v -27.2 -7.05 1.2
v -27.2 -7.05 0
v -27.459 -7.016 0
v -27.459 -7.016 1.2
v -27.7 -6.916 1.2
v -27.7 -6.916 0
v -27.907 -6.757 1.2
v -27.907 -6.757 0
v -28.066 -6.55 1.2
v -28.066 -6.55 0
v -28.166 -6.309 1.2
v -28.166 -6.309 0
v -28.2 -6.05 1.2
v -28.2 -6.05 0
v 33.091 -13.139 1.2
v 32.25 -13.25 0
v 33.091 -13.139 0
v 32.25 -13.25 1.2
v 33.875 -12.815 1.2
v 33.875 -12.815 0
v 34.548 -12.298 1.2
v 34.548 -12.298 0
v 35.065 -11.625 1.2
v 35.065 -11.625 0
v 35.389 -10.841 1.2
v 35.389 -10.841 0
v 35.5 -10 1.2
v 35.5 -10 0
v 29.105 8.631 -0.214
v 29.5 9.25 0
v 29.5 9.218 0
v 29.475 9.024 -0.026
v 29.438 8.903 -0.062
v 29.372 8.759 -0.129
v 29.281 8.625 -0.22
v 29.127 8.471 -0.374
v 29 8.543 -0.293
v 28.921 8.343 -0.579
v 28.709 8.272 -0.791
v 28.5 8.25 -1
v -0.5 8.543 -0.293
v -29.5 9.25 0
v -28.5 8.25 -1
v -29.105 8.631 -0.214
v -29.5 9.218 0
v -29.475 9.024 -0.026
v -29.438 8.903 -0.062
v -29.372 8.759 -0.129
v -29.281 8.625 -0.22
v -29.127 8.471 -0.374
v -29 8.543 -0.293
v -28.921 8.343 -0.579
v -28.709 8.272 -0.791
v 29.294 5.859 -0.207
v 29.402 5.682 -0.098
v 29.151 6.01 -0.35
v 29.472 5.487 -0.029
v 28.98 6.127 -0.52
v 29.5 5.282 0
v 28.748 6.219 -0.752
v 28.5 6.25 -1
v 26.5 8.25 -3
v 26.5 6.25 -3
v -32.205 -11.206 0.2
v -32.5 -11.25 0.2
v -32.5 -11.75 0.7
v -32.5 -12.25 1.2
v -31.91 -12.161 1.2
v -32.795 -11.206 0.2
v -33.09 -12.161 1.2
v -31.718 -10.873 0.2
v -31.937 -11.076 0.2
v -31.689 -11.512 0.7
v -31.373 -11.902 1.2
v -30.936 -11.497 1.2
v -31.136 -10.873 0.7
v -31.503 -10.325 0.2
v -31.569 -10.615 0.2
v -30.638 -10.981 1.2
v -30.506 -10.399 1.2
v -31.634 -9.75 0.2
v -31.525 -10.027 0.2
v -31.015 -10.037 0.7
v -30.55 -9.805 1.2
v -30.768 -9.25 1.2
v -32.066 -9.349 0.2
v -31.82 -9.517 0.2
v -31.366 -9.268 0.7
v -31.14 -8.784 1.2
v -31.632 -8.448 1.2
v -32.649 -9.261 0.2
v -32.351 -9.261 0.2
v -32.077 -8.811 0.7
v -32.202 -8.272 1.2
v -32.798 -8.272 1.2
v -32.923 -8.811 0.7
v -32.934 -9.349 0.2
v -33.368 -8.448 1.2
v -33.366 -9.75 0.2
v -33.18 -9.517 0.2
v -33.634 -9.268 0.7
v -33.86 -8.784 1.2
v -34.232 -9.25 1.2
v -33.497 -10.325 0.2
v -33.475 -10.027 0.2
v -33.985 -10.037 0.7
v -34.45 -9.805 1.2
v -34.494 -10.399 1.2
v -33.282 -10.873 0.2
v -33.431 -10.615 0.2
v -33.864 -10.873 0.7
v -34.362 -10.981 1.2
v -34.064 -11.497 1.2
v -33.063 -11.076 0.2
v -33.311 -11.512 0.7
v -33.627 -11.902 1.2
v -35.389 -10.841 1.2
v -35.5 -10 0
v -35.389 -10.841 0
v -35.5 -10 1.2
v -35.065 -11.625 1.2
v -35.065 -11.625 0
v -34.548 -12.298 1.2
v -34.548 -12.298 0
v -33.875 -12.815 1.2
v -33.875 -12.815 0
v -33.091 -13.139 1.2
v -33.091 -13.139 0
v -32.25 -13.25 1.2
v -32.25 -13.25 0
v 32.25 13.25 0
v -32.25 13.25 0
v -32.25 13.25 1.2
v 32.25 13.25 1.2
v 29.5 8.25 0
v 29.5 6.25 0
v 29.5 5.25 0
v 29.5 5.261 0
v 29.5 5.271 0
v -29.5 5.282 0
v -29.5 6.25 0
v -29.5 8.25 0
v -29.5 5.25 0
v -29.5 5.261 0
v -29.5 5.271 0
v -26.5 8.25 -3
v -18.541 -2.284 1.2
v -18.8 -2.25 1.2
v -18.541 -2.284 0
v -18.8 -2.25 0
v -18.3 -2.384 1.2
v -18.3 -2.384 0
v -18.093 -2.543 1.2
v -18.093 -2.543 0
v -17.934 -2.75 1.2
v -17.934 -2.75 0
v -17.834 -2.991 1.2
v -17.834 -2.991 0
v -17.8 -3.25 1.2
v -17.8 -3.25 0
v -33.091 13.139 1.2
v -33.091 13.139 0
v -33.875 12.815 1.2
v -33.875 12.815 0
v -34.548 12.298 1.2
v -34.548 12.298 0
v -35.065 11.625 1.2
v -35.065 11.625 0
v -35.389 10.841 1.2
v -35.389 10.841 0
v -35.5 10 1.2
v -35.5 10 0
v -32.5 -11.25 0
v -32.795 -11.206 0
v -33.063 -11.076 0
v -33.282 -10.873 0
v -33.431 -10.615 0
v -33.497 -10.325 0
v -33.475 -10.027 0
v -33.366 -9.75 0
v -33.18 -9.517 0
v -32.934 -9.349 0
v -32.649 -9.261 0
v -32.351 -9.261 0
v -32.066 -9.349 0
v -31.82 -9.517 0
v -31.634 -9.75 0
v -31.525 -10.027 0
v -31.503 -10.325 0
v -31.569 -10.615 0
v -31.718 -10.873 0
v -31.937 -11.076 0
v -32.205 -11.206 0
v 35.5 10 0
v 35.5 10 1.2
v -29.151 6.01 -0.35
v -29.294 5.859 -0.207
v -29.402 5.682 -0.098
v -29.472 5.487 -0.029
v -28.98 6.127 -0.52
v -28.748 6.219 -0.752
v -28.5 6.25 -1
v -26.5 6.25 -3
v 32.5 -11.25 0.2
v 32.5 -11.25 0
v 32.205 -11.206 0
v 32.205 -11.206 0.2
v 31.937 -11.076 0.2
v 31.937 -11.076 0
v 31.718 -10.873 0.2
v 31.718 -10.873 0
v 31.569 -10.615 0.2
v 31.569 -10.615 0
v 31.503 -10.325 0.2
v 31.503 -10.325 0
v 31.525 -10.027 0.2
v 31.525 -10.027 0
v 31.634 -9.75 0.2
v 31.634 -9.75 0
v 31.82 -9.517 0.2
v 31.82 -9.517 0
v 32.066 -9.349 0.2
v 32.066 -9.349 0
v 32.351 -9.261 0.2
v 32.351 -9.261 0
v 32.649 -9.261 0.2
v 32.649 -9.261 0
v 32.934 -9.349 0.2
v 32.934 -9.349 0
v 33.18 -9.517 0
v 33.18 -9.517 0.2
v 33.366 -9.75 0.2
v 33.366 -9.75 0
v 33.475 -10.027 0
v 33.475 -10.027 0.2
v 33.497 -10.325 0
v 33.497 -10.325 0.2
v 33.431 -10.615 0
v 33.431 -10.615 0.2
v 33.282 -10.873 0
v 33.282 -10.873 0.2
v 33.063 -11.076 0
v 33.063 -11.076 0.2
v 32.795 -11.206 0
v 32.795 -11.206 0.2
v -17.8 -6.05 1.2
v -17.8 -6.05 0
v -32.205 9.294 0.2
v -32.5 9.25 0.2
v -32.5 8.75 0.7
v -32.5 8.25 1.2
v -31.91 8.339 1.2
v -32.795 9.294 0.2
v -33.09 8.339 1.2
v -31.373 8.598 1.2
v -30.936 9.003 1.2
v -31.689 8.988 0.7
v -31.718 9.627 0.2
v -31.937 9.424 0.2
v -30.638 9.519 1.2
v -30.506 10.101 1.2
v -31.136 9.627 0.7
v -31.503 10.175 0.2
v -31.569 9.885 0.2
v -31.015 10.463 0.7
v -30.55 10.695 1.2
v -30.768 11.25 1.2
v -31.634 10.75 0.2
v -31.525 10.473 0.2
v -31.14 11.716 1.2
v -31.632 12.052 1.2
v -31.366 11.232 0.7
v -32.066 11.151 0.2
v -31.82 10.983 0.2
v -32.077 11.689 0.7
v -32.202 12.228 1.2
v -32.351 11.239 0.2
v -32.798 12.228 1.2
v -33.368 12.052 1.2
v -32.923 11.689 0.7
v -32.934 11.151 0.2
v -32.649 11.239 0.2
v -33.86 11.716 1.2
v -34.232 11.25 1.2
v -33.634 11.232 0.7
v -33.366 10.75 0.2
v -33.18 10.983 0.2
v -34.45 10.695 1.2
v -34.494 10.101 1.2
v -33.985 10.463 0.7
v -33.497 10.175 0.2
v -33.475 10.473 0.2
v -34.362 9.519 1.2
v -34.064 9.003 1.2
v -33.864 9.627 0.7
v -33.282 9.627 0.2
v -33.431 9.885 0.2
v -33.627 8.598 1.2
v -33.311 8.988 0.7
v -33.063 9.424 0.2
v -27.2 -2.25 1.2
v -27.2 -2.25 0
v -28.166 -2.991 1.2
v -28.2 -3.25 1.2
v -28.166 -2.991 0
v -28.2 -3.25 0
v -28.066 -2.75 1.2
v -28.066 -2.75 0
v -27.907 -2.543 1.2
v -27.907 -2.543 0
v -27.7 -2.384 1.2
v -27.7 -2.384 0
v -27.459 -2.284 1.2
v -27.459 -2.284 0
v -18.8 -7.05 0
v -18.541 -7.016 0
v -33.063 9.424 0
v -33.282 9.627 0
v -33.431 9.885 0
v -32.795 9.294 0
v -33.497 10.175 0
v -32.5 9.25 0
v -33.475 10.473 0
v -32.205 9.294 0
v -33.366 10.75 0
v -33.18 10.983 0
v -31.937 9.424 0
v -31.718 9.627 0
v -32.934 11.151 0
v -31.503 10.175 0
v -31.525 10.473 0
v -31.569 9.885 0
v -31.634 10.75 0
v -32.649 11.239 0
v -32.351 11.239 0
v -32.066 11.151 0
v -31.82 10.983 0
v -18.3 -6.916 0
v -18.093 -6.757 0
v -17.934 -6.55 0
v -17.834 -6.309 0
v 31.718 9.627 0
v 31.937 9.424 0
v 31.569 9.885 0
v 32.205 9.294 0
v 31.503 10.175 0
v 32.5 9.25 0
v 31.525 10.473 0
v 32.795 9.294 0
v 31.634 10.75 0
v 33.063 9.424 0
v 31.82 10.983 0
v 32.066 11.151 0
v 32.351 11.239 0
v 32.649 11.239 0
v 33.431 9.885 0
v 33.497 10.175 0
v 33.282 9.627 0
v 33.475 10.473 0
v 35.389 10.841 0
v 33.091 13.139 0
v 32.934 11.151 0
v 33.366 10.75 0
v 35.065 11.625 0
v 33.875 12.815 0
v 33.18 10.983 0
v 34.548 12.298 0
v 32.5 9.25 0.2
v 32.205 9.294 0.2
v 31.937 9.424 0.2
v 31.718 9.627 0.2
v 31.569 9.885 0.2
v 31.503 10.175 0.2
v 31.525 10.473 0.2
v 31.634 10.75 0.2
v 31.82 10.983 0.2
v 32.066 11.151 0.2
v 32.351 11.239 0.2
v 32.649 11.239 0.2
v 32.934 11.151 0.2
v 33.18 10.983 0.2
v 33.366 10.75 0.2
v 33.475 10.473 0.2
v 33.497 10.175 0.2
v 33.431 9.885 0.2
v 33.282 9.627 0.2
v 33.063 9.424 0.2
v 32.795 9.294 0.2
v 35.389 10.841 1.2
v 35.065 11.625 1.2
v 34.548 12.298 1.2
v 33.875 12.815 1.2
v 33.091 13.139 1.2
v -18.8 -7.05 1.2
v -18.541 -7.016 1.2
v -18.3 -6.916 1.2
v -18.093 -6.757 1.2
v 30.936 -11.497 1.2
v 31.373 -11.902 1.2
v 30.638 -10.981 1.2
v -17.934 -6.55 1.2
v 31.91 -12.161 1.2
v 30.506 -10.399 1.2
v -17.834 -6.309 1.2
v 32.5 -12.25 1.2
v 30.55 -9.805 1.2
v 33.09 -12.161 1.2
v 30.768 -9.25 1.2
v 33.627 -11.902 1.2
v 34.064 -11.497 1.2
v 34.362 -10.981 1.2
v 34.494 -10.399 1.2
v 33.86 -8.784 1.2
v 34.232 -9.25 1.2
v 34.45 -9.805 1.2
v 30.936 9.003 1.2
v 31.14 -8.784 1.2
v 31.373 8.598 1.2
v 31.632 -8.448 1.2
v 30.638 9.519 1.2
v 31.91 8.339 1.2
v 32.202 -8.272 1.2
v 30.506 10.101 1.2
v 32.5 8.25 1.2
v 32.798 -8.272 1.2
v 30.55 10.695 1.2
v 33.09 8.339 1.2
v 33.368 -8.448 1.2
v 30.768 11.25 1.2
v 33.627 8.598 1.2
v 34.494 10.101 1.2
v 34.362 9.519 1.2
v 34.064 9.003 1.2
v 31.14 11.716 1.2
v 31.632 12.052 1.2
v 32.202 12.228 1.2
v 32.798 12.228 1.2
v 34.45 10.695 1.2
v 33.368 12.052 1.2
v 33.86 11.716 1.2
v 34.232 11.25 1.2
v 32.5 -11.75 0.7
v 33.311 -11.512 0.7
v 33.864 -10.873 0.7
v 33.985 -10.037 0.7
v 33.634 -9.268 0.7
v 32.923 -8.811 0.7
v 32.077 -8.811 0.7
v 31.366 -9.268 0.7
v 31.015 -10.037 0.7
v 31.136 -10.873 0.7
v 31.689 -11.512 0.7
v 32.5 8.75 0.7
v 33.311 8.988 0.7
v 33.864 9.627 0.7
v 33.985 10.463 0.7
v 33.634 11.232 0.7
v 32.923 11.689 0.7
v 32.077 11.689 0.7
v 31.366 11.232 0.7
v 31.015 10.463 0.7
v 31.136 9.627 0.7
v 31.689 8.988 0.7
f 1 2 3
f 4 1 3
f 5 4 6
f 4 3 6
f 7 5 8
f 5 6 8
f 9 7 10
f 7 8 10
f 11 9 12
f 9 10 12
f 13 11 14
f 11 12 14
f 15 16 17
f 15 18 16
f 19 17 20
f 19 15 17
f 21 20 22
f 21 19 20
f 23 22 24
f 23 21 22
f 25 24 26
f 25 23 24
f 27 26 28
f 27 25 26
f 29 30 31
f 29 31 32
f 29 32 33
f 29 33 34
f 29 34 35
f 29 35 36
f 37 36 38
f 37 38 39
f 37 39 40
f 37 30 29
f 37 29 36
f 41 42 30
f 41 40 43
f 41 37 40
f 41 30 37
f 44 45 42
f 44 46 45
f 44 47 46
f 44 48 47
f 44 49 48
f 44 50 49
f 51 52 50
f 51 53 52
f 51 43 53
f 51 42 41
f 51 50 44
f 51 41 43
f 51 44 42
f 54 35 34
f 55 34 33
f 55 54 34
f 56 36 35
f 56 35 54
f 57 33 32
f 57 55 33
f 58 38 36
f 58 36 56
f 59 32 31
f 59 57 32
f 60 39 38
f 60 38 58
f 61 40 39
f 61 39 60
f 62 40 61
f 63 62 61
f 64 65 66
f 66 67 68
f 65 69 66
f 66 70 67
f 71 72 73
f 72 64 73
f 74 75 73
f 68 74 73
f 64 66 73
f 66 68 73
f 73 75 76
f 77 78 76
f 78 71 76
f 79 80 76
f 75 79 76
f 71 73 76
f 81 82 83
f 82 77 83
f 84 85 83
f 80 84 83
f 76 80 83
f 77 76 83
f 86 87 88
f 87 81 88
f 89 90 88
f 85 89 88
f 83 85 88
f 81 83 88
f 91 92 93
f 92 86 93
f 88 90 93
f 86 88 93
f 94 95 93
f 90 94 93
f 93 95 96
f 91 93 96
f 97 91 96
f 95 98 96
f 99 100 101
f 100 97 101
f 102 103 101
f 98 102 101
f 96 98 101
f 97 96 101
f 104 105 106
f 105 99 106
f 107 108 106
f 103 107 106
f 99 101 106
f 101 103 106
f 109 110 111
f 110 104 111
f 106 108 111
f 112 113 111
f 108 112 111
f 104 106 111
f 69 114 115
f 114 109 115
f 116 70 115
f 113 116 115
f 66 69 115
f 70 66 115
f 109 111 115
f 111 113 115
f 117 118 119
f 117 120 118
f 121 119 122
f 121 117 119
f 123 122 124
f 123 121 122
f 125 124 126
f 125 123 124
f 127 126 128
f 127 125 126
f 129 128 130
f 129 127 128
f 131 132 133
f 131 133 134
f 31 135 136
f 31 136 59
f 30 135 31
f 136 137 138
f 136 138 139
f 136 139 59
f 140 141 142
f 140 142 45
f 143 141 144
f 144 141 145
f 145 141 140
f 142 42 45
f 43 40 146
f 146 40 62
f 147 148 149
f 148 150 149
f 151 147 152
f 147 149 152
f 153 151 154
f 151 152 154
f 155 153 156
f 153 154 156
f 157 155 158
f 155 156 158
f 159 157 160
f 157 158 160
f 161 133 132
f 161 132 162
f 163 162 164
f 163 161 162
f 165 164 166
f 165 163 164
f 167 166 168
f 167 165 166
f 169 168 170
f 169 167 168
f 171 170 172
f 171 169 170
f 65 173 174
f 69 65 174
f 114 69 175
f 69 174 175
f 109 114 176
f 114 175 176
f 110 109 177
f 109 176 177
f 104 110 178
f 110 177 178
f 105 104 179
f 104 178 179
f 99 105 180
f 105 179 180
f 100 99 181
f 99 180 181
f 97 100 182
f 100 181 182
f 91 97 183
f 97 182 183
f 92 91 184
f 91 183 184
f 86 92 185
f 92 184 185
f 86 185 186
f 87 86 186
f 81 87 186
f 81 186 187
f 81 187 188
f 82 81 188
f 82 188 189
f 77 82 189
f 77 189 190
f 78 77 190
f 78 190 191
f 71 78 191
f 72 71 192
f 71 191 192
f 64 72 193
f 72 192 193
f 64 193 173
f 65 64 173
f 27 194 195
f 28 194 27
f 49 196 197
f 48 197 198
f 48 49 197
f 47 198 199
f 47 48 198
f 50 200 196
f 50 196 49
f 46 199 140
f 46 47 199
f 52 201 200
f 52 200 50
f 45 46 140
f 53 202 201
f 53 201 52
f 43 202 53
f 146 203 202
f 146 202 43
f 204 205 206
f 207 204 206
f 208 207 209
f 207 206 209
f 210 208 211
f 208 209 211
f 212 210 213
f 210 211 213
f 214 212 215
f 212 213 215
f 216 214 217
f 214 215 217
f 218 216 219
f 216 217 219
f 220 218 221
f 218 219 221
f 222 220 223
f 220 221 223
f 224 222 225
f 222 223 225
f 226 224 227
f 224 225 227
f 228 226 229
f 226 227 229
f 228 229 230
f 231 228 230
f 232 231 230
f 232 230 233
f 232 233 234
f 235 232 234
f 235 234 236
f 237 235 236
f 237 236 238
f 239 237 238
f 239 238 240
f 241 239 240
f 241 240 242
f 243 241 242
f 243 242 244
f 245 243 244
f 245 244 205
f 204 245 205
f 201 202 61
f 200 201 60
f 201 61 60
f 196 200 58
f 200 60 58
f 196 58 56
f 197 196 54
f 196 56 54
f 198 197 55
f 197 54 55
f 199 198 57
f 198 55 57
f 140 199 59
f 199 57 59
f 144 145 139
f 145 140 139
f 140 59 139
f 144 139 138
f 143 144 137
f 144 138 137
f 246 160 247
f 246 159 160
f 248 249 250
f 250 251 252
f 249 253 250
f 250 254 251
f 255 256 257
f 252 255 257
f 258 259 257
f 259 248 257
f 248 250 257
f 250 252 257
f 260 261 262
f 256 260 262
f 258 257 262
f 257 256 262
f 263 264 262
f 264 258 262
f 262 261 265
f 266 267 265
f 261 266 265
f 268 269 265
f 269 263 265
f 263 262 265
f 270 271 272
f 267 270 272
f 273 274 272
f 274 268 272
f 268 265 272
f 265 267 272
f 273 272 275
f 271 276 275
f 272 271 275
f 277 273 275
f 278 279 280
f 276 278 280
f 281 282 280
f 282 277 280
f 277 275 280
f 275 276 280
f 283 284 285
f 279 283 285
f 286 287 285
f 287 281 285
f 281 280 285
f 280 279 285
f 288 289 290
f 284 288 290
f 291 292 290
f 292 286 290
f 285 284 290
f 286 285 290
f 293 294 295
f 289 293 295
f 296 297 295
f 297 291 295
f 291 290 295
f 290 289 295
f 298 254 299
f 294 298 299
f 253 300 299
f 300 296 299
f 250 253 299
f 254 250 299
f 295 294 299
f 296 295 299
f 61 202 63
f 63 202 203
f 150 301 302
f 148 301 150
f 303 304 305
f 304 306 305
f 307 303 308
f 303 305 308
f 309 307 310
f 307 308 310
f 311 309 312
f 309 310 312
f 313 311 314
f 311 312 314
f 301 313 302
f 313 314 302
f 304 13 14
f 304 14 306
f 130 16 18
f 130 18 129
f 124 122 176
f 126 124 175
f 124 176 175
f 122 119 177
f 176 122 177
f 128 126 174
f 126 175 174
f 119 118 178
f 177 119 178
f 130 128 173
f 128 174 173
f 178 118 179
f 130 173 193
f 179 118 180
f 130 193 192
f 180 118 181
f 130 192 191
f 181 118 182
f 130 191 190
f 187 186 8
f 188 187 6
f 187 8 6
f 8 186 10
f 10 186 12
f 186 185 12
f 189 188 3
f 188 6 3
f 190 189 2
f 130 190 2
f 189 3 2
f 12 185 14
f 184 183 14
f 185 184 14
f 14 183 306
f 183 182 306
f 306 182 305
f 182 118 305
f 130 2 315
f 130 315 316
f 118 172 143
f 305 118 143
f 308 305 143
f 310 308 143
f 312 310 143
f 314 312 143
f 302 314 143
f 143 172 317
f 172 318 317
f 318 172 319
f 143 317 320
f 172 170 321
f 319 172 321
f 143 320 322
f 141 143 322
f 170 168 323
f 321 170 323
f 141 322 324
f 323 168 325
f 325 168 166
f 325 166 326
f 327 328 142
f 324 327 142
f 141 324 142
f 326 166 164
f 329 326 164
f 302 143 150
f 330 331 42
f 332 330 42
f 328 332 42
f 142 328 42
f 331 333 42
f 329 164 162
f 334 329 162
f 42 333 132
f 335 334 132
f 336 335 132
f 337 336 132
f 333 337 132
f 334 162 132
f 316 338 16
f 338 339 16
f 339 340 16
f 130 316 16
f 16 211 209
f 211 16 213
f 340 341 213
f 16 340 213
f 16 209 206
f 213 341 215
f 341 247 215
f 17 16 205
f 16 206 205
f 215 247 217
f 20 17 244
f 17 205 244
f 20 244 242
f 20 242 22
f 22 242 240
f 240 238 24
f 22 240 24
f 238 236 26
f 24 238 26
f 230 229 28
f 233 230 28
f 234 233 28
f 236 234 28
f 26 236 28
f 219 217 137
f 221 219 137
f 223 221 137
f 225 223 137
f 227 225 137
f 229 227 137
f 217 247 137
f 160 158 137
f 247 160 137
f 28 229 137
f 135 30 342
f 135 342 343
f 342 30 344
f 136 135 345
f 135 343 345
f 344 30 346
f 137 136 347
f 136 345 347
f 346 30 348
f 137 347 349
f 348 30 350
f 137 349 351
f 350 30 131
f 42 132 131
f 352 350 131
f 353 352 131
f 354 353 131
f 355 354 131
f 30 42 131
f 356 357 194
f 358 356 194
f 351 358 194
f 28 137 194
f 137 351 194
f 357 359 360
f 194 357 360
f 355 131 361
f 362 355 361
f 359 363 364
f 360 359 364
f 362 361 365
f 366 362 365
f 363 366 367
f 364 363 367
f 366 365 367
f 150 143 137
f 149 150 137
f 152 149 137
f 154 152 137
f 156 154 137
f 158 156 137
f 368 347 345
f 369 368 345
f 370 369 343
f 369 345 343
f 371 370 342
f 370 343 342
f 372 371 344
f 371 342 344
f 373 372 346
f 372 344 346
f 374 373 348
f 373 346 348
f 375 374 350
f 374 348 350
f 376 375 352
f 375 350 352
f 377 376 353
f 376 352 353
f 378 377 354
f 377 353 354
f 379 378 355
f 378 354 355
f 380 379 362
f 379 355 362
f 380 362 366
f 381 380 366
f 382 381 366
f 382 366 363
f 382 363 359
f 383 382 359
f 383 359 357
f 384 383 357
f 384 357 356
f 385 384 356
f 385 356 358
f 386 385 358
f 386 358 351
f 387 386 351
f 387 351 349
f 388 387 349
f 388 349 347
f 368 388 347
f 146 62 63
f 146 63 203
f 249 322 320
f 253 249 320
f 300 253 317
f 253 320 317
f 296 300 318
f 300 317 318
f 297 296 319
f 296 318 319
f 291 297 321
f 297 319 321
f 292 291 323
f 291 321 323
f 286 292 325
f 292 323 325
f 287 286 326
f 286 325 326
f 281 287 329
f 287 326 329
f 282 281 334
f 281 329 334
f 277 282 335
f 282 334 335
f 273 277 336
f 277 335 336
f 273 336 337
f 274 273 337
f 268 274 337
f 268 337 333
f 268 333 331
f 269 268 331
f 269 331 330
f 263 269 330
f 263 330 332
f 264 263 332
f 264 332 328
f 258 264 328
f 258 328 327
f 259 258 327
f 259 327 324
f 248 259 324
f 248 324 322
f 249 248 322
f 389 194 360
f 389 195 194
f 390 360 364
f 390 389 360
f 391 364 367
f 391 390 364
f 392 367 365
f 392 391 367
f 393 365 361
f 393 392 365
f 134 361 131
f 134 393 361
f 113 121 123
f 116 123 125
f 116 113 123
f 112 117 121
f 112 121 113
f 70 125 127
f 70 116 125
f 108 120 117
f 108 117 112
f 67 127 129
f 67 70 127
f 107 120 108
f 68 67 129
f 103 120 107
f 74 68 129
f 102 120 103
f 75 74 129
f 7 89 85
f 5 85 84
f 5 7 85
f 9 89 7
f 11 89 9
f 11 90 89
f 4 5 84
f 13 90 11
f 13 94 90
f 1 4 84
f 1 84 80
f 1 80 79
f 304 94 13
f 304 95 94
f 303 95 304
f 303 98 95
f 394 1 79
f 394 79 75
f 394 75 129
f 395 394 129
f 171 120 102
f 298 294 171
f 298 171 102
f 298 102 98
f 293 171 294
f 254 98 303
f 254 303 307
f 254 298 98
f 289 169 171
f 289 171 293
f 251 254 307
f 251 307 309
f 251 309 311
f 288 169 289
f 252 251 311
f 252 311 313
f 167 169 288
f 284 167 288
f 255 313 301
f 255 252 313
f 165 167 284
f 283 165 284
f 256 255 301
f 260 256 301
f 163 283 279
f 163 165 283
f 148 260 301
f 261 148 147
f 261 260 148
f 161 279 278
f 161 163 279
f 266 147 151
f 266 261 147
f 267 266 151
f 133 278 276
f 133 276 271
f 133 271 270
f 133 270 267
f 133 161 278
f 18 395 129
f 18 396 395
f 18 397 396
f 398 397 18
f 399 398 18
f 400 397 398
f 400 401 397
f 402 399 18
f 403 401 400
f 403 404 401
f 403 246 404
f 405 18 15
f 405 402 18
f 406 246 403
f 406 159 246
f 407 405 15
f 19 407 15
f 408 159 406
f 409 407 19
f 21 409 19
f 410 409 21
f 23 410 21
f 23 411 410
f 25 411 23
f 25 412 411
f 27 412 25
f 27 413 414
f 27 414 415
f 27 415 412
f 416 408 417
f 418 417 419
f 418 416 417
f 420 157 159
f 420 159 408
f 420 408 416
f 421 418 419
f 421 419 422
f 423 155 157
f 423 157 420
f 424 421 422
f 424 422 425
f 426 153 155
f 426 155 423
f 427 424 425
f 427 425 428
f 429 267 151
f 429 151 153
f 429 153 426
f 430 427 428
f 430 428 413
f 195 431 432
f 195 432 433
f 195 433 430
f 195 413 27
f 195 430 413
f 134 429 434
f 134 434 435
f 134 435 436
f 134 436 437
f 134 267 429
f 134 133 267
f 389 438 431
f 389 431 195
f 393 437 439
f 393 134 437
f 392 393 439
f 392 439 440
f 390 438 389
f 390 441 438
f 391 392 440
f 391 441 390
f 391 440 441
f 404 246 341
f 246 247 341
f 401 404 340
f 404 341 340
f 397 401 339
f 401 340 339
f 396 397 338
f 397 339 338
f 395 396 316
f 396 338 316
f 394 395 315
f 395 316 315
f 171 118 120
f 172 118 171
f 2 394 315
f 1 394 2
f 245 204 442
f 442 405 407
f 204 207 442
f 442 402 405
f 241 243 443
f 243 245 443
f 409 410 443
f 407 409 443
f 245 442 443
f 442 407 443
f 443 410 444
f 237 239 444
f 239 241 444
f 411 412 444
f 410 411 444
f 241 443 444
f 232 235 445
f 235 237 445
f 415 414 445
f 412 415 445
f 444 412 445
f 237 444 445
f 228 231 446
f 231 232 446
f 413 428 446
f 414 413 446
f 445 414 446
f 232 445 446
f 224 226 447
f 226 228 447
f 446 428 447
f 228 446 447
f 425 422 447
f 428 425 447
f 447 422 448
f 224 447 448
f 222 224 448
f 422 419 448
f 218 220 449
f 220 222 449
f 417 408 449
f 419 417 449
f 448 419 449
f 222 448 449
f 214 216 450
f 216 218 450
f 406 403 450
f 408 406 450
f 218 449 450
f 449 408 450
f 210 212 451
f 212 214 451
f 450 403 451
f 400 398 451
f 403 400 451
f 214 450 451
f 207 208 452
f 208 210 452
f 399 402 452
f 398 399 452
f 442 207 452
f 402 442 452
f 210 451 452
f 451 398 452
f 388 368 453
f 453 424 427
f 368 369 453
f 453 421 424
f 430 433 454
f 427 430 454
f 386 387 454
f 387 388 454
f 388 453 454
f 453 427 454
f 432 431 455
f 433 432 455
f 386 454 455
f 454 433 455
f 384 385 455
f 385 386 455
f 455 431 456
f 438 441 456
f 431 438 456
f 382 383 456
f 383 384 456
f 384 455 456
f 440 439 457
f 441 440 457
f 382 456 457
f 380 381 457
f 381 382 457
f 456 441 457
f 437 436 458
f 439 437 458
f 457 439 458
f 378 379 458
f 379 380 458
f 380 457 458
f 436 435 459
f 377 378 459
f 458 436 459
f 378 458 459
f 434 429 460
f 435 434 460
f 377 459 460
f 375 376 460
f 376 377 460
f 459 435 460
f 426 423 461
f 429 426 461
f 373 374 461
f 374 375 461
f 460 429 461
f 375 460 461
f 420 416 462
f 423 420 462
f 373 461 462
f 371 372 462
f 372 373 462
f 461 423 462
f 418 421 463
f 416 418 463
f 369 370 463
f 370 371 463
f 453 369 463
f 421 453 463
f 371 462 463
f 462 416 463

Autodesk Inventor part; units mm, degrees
ref_plane "YZ Plane" through (0, 0, 0) normal (1, 0, 0) x (0, 1, 0)
ref_plane "XZ Plane" through (0, 0, 0) normal (0, 1, 0) x (-1, 0, 0)
ref_plane "XY Plane" through (0, 0, 0) normal (0, 0, 1) x (1, 0, 0)
sketch "Sketch1" plane through (0, 0, 0) normal (0, 0, 1) x (1, 0, 0)
  line L0 (-35.5, 13.25) -> (35.5, 13.25)
  line L1 (35.5, 13.25) -> (35.5, -13.25)
  line L2 (35.5, -13.25) -> (-35.5, -13.25)
  line L3 (-35.5, -13.25) -> (-35.5, 13.25)
  point P0 (0, 0)
  dimension "d0" = 26.5
  dimension "d1" = 71
  dimension "d2" = 35.5
  dimension "d3" = 13.25
extrude "Extrusion1" add sketch "Sketch1" along normal blind 1.2
fillet "Fillet1" radius 3.25 4 edges at (-35.5, 13.25, 0.6) (-35.5, -13.25, 0.6) (35.5, -13.25, 0.6) (35.5, 13.25, 0.6)
sketch "Sketch2" plane through (0, 0, 1.2) normal (0, 0, 1) x (1, 0, 0)
  line L0 (32.25, 13.25) -> (-32.25, 13.25) projected
  line L1 (-35.5, 10) -> (-35.5, -10) projected
  line L2 (-32.25, -13.25) -> (32.25, -13.25) projected
  line L3 (35.5, -10) -> (35.5, 10) projected
  point P0 (0, 0)
  point P1 (-32.5, 10.25)
  point P2 (32.5, 10.25)
  point P3 (32.5, -10.25)
  point P4 (-32.5, -10.25)
  dimension "d7" = 3
  dimension "d8" = 3
  dimension "d9" = 3
  dimension "d10" = 3
  dimension "d11" = 3
  dimension "d12" = 3
  dimension "d13" = 3
  dimension "d14" = 3
hole "Hole1" at (-32.5, 10.25, 1.2) at (32.5, 10.25, 1.2) at (32.5, -10.25, 1.2) at (-32.5, -10.25, 1.2) direction (0, 0, -1) diameter 2 depth 4 tip angle 118 countersink diameter 4 countersink angle 90
sketch "Sketch3" plane through (0, 0, 1.2) normal (0, 0, 1) x (1, 0, 0)
  line L0 (-28.2, -2.25) -> (-17.8, -2.25)
  line L1 (-17.8, -2.25) -> (-17.8, -7.05)
  line L2 (-17.8, -7.05) -> (-28.2, -7.05)
  line L3 (-28.2, -7.05) -> (-28.2, -2.25)
  line L4 (-35.5, 10) -> (-35.5, -10) projected
  line L5 (-32.25, -13.25) -> (32.25, -13.25) projected
  point P0 (0, 0)
  dimension "d22" = 7.3
  dimension "d23" = 17.7
  dimension "d24" = 6.2
  dimension "d25" = 11
extrude "Extrusion2" cut sketch "Sketch3" against normal blind 1.2
fillet "Fillet2" radius 1 4 edges at (-28.2, -2.25, 0.6) (-28.2, -7.05, 0.6) (-17.8, -2.25, 0.6) (-17.8, -7.05, 0.6)
sketch "Sketch4" plane through (0, 0, 0) normal (0, 0, -1) x (-1, 0, 0)
  line L0 (-29.5, 8.25) -> (29.5, 8.25)
  line L1 (29.5, 8.25) -> (29.5, 6.25)
  line L2 (29.5, 6.25) -> (-29.5, 6.25)
  line L3 (-29.5, 6.25) -> (-29.5, 8.25)
  line L4 (-35.5, -10) -> (-35.5, 10) projected
  line L5 (35.5, 10) -> (35.5, -10) projected
  line L6 (-32.25, 13.25) -> (32.25, 13.25) projected
  point P0 (0, 0)
  dimension "d29" = 6
  dimension "d30" = 6
  dimension "d31" = 5
  dimension "d32" = 2
extrude "Extrusion3" add sketch "Sketch4" along normal blind 3
fillet "Fillet3" radius 1 2 edges at (0, 6.25, 0) (0, 8.25, 0)
chamfer "Chamfer1" distance 3 angle 45 2 edges at (29.5, 7.25, -3) (-29.5, 7.25, -3)
properties part number "cover"
